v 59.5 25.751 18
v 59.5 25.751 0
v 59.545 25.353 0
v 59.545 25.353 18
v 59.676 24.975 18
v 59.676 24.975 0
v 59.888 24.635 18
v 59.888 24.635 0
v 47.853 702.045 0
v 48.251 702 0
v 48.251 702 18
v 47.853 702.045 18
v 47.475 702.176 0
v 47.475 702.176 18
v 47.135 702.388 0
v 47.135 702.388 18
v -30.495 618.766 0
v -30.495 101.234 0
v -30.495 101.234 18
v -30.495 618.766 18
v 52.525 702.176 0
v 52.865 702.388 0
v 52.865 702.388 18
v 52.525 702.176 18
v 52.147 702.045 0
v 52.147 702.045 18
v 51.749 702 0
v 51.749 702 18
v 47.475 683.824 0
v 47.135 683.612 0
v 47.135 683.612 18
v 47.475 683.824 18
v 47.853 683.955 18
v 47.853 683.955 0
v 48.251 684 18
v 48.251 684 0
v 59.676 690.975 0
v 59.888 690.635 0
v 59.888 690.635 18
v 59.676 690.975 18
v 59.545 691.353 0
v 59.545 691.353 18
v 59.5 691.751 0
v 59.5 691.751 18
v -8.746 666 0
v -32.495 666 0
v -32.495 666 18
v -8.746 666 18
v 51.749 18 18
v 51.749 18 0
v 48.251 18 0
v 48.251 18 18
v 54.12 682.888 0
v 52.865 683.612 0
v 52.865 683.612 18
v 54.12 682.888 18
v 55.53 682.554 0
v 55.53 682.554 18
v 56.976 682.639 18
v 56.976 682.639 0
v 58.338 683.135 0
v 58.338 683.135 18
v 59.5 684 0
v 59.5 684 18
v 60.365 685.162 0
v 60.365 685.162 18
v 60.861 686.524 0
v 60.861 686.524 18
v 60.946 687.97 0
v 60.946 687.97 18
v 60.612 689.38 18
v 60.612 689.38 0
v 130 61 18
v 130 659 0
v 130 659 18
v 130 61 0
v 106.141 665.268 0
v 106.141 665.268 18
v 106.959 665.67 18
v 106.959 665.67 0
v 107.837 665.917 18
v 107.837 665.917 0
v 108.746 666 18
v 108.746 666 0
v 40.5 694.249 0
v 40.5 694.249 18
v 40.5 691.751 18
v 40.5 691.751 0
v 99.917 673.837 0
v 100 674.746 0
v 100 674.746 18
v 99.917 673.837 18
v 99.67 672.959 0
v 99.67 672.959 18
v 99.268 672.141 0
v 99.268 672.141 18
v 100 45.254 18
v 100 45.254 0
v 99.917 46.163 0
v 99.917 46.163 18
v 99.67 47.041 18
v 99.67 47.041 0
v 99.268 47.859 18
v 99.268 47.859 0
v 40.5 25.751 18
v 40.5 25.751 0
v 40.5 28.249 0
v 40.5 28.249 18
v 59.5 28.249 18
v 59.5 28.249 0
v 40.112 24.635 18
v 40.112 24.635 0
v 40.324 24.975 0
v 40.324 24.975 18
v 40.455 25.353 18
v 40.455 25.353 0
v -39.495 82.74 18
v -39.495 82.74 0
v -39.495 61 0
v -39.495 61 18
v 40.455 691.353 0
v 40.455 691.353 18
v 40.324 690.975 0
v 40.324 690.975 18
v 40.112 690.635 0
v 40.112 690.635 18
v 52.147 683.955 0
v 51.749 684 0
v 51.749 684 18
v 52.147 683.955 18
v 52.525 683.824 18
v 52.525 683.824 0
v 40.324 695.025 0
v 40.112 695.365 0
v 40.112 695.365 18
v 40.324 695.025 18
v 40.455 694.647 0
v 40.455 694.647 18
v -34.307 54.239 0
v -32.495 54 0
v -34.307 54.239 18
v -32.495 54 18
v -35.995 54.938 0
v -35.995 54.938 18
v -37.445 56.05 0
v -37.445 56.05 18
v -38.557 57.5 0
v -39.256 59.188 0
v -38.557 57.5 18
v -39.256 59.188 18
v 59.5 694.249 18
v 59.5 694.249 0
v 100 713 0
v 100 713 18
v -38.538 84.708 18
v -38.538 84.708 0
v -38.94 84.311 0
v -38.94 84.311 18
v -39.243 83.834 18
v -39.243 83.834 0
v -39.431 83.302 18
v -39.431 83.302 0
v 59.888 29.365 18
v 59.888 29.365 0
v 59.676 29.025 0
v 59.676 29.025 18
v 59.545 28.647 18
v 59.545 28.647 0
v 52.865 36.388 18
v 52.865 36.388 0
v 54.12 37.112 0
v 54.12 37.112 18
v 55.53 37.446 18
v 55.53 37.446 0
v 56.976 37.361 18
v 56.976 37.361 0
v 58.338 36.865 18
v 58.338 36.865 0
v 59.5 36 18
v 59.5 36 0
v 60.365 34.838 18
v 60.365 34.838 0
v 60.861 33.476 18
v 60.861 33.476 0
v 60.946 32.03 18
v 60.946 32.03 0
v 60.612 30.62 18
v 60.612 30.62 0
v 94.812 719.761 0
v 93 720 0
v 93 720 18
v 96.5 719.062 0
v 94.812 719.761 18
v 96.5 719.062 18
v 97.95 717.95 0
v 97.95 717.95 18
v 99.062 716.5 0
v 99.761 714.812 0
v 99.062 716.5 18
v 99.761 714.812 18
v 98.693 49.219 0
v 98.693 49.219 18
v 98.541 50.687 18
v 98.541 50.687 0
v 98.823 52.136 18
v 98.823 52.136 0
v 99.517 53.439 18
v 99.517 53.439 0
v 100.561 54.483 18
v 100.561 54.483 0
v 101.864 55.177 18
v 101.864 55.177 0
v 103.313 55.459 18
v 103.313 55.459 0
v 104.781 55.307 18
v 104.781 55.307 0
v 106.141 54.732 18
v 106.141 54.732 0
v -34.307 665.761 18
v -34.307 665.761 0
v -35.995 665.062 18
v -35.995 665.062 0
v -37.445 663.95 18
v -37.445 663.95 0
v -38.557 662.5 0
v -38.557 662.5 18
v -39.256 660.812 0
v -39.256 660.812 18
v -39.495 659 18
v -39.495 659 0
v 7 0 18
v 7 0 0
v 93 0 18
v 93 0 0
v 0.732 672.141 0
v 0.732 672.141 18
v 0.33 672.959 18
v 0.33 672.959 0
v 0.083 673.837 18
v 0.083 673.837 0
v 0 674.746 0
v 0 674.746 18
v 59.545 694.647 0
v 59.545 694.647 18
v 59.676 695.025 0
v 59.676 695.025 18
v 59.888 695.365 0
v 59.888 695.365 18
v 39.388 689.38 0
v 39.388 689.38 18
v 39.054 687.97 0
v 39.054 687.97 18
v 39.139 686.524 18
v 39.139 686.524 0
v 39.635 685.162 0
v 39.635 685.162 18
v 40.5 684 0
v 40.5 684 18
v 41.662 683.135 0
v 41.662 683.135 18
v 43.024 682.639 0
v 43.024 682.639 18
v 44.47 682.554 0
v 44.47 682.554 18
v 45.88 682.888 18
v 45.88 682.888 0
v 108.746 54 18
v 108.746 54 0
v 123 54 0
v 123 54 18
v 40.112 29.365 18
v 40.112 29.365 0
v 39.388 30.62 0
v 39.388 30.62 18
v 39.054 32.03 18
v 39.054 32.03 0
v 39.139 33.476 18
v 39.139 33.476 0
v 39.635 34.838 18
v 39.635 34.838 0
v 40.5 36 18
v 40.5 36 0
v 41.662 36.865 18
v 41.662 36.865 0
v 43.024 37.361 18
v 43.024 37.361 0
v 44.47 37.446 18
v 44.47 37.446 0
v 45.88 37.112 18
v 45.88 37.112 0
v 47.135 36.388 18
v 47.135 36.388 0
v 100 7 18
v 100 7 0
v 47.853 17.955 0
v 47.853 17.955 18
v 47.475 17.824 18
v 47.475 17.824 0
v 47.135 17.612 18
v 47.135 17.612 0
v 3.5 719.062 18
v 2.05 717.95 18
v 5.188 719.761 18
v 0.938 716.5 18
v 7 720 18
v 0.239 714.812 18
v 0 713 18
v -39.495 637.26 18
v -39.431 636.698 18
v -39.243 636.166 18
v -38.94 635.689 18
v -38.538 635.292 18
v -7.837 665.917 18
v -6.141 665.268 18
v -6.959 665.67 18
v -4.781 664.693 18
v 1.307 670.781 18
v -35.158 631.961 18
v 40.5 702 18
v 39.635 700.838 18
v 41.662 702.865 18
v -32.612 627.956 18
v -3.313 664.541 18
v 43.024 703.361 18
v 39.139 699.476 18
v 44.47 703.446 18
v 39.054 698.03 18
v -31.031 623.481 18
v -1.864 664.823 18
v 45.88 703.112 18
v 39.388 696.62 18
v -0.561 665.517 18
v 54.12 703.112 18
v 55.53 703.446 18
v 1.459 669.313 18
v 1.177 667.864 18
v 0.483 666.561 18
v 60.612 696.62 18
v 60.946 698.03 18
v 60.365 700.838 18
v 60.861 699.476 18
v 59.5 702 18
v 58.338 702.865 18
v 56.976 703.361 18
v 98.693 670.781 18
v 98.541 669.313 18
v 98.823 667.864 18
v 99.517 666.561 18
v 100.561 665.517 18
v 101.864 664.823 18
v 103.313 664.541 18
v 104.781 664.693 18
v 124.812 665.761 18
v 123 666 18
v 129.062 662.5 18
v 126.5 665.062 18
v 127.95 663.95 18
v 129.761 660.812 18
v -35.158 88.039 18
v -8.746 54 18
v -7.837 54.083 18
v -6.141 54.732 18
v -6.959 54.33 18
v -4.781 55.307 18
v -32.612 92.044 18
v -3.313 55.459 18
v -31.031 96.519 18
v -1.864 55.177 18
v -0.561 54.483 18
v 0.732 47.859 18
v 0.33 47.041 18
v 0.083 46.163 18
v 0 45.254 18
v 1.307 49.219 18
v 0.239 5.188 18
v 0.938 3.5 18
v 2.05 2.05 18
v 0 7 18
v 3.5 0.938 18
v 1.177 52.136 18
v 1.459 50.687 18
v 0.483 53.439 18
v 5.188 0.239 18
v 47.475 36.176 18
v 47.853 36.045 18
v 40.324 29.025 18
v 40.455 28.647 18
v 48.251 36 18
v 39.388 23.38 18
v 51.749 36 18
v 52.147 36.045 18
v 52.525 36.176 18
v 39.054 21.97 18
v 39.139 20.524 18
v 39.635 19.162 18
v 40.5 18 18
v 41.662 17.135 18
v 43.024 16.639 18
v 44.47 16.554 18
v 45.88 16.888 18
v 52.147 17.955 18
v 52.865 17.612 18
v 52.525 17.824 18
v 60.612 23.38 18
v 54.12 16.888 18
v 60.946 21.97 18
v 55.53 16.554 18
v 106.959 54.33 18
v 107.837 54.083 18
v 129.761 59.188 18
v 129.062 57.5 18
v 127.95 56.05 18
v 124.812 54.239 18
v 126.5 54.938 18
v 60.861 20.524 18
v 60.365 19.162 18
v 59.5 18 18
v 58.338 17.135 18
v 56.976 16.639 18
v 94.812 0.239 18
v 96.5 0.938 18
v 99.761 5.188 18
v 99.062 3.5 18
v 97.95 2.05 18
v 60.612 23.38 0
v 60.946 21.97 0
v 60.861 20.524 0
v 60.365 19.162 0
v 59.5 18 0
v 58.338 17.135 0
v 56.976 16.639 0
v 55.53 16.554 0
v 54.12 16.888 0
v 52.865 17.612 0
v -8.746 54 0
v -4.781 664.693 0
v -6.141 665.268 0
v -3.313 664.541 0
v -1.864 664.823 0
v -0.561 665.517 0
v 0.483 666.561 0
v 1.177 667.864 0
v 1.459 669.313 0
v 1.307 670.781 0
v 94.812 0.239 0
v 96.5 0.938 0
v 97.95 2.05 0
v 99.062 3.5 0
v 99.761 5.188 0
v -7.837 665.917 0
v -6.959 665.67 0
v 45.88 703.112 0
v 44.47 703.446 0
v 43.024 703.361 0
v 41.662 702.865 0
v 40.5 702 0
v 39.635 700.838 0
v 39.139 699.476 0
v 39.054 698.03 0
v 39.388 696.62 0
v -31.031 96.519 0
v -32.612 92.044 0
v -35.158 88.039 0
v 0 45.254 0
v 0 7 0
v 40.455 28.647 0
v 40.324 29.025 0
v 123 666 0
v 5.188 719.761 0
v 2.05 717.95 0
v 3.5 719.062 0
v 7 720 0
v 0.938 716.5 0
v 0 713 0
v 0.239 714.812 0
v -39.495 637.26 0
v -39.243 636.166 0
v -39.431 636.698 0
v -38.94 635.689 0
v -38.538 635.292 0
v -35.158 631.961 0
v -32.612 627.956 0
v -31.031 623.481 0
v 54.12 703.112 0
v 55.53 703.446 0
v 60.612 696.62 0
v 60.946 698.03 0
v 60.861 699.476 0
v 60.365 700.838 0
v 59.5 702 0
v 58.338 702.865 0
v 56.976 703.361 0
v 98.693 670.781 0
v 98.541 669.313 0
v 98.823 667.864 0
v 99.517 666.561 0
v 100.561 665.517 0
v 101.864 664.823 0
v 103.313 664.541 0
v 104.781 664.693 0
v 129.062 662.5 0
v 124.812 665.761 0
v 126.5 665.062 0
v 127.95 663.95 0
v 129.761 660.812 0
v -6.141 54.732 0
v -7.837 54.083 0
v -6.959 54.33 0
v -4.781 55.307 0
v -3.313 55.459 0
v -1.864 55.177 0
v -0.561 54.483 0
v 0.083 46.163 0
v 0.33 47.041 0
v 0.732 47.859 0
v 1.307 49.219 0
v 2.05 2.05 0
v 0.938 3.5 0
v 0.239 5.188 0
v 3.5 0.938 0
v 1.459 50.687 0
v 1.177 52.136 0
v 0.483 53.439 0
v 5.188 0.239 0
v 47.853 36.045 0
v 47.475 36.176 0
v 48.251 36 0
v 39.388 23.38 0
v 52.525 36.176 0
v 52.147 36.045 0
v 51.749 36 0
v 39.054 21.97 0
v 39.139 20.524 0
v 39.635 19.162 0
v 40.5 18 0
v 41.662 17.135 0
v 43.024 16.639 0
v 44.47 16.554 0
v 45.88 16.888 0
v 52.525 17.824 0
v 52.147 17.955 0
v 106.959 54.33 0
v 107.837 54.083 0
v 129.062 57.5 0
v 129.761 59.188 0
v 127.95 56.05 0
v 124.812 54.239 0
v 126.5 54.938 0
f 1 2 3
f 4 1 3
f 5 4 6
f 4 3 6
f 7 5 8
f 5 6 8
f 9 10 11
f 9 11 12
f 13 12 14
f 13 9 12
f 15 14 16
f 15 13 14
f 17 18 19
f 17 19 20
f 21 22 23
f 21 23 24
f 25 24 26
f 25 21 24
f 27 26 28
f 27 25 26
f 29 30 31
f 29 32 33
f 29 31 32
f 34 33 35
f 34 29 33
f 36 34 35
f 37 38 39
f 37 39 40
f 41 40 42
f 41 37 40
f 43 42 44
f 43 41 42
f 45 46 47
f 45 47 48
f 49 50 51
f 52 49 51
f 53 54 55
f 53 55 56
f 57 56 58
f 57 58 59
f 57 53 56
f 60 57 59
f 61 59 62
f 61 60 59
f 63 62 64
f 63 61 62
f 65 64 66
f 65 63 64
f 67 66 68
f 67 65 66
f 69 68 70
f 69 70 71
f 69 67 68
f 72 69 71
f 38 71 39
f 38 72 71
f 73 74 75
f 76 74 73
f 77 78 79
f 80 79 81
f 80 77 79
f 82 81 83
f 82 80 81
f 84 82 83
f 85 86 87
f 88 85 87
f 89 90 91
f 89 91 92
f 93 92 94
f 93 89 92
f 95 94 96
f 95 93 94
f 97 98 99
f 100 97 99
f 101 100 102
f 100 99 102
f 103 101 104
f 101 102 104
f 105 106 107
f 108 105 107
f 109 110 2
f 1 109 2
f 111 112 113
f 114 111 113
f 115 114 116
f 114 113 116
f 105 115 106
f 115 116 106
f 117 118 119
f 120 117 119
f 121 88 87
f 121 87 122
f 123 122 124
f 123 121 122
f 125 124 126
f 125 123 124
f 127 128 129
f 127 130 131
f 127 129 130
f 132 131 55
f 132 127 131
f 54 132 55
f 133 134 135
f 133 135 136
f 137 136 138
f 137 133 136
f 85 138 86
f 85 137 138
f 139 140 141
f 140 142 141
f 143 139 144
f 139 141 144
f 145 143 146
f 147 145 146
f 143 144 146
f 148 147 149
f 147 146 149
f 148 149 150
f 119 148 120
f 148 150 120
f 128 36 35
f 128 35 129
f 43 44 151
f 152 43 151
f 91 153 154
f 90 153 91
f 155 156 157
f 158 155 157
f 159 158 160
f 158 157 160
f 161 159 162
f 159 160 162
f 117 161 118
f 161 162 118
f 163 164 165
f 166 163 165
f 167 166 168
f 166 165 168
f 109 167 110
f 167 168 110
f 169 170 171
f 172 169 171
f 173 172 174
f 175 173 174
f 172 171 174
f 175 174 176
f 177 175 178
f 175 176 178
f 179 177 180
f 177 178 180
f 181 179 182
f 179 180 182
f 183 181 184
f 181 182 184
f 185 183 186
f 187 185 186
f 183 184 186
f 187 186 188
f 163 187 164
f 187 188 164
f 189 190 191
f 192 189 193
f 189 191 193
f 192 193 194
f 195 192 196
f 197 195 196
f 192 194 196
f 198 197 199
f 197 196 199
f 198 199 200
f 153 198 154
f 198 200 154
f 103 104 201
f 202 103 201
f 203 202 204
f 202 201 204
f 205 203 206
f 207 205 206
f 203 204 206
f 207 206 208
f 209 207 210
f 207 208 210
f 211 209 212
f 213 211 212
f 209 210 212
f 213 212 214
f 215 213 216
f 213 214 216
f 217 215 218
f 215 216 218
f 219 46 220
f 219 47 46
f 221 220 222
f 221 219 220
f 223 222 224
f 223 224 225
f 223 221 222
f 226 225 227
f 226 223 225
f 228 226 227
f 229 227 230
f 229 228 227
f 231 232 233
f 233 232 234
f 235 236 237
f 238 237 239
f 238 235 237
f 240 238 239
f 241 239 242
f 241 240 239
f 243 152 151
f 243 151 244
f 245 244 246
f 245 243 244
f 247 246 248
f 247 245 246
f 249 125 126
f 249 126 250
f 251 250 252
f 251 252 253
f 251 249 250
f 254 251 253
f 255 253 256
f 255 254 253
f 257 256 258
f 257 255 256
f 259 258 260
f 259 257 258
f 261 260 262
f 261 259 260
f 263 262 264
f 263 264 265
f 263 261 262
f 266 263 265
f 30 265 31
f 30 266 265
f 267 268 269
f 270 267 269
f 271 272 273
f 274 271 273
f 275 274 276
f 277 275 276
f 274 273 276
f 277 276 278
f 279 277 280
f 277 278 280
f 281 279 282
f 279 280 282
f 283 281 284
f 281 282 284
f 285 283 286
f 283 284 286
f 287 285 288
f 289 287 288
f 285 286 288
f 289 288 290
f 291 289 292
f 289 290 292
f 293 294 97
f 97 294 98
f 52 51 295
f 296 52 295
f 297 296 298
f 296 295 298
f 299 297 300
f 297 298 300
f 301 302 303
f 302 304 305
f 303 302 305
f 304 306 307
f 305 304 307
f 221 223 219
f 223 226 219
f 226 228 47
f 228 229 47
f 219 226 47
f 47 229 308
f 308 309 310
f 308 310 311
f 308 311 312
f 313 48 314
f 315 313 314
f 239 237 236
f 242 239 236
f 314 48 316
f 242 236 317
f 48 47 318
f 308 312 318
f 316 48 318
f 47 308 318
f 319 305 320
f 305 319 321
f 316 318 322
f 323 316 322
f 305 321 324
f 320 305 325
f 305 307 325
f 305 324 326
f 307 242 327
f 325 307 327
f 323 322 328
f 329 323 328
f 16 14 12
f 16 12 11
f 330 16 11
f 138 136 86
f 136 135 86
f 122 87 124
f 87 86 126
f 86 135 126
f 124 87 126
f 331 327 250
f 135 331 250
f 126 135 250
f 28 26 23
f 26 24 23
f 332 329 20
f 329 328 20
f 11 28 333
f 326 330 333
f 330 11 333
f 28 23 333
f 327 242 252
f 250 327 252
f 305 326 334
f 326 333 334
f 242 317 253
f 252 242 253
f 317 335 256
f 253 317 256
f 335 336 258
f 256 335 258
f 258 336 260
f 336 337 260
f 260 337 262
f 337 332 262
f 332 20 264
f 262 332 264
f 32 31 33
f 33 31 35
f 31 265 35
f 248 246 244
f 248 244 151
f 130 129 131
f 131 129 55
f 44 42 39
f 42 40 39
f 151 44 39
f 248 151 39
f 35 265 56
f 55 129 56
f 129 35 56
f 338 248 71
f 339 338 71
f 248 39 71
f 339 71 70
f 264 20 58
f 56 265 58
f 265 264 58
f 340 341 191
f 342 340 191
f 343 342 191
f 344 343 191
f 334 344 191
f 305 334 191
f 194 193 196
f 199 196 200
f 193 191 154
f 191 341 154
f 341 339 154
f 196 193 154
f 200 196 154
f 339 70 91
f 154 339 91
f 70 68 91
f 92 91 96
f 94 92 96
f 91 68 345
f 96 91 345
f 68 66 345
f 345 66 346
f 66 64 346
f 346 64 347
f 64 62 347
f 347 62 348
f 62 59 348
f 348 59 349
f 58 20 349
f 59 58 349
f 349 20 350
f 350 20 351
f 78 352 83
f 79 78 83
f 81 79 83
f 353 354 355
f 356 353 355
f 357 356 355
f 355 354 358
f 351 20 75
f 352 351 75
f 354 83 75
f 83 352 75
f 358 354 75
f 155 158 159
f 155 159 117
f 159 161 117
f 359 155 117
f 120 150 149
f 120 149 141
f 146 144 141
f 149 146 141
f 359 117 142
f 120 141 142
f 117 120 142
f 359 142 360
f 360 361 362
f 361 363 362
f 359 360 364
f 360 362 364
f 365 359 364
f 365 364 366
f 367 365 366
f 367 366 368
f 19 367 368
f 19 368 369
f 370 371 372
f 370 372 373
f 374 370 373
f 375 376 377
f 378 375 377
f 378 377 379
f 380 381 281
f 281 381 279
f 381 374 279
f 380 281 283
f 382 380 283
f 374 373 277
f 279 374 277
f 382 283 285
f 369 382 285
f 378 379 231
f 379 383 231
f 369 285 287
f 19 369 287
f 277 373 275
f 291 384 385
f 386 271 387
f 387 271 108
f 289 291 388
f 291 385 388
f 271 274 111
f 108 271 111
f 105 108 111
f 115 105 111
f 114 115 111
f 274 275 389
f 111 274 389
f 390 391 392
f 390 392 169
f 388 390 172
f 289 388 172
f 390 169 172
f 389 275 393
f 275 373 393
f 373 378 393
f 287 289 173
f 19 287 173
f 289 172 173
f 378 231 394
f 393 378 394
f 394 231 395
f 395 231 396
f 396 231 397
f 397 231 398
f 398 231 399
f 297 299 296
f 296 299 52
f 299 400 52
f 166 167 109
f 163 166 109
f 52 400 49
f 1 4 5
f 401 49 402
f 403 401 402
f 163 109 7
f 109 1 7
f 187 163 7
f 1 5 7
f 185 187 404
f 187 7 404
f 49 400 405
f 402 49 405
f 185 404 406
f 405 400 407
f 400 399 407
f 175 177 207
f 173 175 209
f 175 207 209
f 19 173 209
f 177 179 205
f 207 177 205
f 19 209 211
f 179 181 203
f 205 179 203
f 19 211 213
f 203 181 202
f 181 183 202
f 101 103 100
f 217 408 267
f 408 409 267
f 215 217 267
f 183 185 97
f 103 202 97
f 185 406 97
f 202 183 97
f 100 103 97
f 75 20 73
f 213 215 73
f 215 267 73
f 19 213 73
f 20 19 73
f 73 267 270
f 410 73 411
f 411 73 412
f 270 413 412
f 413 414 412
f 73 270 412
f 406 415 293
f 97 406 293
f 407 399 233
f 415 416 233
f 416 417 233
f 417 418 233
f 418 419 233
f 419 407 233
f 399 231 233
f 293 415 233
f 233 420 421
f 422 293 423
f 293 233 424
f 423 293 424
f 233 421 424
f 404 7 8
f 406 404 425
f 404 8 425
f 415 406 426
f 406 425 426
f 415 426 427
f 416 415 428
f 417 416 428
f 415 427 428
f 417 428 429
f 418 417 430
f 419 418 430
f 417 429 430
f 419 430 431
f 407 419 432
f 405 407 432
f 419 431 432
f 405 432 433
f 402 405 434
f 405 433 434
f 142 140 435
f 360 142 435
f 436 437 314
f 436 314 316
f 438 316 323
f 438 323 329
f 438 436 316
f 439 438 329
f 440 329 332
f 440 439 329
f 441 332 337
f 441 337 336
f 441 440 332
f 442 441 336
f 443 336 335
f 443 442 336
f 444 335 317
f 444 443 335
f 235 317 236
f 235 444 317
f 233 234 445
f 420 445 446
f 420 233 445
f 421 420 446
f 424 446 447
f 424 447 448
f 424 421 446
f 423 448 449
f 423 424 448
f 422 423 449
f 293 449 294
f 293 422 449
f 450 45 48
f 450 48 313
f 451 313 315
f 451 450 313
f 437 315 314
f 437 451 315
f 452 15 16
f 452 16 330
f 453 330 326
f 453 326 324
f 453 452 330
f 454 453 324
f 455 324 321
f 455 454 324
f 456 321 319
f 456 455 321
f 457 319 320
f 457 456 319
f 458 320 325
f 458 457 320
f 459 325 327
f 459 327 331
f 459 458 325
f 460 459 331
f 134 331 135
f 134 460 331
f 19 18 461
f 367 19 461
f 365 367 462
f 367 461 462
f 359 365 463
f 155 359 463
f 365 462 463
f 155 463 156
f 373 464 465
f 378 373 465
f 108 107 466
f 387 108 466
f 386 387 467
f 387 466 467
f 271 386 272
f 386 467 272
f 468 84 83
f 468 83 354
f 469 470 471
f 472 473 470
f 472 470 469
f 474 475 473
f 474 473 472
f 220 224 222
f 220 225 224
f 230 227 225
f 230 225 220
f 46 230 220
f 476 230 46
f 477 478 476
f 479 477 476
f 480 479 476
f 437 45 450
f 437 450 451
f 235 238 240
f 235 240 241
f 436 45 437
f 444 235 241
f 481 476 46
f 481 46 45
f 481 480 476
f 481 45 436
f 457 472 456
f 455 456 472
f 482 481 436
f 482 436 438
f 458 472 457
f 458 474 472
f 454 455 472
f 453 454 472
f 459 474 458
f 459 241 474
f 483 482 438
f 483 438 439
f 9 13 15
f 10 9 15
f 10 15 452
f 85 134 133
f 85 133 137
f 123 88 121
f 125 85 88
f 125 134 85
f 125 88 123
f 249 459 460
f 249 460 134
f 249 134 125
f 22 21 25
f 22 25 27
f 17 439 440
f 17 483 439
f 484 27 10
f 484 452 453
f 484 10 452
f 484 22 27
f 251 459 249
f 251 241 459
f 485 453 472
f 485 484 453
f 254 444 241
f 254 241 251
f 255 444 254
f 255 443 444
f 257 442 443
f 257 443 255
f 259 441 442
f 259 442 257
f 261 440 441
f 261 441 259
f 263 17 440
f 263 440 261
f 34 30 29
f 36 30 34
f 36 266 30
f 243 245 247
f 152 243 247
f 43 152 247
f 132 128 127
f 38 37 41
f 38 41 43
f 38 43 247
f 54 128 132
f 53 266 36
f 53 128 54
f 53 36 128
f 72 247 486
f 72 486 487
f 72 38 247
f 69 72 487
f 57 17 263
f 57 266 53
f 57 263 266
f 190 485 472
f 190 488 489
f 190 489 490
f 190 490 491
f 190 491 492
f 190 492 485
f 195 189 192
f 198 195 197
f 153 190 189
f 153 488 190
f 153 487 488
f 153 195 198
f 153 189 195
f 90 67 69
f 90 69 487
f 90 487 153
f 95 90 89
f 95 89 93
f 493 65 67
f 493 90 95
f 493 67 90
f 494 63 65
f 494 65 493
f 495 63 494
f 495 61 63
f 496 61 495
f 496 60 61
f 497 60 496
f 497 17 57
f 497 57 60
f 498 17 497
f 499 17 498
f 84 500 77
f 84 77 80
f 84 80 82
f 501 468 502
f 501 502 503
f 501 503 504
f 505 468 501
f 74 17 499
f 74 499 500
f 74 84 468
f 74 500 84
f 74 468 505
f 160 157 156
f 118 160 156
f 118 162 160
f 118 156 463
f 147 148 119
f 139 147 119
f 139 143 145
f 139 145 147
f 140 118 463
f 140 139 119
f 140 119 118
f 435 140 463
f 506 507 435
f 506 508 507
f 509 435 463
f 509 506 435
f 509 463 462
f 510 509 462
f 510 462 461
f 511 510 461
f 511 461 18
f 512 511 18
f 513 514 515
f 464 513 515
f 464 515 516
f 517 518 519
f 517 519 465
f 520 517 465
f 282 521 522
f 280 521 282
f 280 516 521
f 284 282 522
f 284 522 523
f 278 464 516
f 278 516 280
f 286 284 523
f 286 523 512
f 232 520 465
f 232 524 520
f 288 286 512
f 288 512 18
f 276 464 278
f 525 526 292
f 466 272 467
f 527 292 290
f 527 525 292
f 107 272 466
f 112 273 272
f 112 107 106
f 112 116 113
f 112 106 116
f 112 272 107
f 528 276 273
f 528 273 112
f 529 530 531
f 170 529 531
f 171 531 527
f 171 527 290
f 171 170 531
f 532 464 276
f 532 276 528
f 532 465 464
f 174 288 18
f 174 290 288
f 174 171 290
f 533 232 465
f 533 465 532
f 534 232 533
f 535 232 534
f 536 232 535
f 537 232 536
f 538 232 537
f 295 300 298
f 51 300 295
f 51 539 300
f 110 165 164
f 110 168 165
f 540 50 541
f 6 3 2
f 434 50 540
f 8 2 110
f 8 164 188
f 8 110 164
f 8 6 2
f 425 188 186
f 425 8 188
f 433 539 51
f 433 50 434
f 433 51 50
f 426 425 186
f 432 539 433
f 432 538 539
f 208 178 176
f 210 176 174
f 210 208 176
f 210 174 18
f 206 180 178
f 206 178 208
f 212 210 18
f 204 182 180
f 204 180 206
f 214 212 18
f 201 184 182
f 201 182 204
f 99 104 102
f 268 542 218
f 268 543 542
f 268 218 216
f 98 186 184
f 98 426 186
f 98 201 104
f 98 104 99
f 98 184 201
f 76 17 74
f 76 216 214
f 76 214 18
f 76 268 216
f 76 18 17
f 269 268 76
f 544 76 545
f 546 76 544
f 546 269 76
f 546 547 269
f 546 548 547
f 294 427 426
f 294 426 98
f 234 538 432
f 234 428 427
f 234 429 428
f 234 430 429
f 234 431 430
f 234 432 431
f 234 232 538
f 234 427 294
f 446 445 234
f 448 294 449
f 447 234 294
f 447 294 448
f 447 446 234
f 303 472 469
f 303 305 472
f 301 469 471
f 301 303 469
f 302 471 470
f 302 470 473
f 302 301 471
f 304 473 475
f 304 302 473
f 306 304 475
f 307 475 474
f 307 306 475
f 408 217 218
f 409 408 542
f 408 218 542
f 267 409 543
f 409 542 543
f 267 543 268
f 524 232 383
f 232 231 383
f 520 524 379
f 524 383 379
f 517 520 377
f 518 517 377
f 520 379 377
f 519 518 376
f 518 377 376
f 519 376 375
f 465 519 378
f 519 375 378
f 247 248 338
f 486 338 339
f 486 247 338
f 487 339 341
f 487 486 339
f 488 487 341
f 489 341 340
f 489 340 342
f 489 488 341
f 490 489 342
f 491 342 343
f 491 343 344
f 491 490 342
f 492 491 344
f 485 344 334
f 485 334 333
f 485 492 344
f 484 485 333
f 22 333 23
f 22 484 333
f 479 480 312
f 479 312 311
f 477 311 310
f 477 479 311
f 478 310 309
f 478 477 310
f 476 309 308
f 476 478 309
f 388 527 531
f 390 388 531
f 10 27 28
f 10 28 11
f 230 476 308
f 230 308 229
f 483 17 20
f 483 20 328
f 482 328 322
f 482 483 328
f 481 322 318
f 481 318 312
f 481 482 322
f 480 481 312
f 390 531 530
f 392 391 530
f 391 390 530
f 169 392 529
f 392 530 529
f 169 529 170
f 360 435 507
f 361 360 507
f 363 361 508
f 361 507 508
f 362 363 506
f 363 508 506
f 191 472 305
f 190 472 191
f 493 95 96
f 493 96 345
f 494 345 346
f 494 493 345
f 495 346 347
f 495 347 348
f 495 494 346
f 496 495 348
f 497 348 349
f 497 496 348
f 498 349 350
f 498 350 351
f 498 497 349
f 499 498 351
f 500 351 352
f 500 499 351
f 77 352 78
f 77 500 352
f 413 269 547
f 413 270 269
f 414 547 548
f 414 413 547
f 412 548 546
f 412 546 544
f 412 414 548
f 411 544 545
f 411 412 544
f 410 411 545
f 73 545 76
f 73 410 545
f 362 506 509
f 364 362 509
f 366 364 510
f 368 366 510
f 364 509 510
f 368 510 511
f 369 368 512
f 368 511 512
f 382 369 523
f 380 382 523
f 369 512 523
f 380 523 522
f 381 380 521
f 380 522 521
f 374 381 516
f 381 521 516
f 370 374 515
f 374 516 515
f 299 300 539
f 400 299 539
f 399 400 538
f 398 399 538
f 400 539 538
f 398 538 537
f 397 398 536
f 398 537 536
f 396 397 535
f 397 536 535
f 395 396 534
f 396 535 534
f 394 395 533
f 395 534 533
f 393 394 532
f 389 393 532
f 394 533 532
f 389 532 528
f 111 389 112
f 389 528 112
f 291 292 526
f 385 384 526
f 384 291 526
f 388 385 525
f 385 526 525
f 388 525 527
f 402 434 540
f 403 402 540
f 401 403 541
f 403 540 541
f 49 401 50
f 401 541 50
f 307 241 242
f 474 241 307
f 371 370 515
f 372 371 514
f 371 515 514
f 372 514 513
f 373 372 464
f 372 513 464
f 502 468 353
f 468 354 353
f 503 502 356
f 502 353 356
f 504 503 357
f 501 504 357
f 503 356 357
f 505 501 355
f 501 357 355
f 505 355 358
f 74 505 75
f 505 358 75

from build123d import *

# Parameters (mm, degrees)
BOSS_EXTRU_2_DEPTH      = 18
ENL_V_MAT_EXTRU_1_DEPTH = 19
CONG_1_R                = 7


with BuildPart() as part:
    # Esquisse2 → Boss.-Extru.2 (new body)
    with BuildSketch(Plane.XY):
        with BuildLine():
            Line((0, 0), (100, 0))
            Line((100, 0), (100, 45.254412261))
            ThreePointArc((100, 45.254412261), (99.813462099, 46.607402512), (99.267766953, 47.859439178))
            ThreePointArc((99.267766953, 47.859439178), (100, 54), (106.140560822, 54.732233047))
            ThreePointArc((106.140560822, 54.732233047), (107.392597488, 54.186537901), (108.745587739, 54))
            Line((108.745587739, 54), (130, 54))
            Line((130, 54), (130, 360))
            Line((130, 360), (-30.494949366, 360))
            Line((-30.494949366, 360), (-30.494949366, 101.23368794))
            ThreePointArc((-30.494949366, 101.23368794), (-32.612333247, 92.044193475), (-38.537502558, 84.707812102))
            ThreePointArc((-38.537502558, 84.707812102), (-39.242879856, 83.834433367), (-39.494949366, 82.740445931))
            Line((-39.494949366, 82.740445931), (-39.494949366, 54))
            Line((-39.494949366, 54), (-8.745587739, 54))
            ThreePointArc((-8.745587739, 54), (-7.392597488, 54.186537901), (-6.140560822, 54.732233047))
            ThreePointArc((-6.140560822, 54.732233047), (0, 54), (0.732233047, 47.859439178))
            ThreePointArc((0.732233047, 47.859439178), (0.186537901, 46.607402512), (0, 45.254412261))
            Line((0, 45.254412261), (0, 0))
        make_face()
    extrude(amount=BOSS_EXTRU_2_DEPTH)

    # Esquisse1 → Enlèv. mat.-Extru.1 (cut, through all)
    with BuildSketch(Plane.XY):
        with BuildLine():
            Line((59.5, 28.248771852), (59.5, 25.751228148))
            ThreePointArc((59.5, 25.751228148), (59.599672829, 25.160561143), (59.88765279, 24.635309084))
            ThreePointArc((59.88765279, 24.635309084), (59.5, 18), (52.864690916, 17.61234721))
            ThreePointArc((52.864690916, 17.61234721), (52.339438857, 17.900327171), (51.748771852, 18))
            Line((51.748771852, 18), (48.251228148, 18))
            ThreePointArc((48.251228148, 18), (47.660561143, 17.900327171), (47.135309084, 17.61234721))
            ThreePointArc((47.135309084, 17.61234721), (40.5, 18), (40.11234721, 24.635309084))
            ThreePointArc((40.11234721, 24.635309084), (40.400327171, 25.160561143), (40.5, 25.751228148))
            Line((40.5, 25.751228148), (40.5, 28.248771852))
            ThreePointArc((40.5, 28.248771852), (40.400327171, 28.839438857), (40.11234721, 29.364690916))
            ThreePointArc((40.11234721, 29.364690916), (40.5, 36), (47.135309084, 36.38765279))
            ThreePointArc((47.135309084, 36.38765279), (47.660561143, 36.099672829), (48.251228148, 36))
            Line((48.251228148, 36), (51.748771852, 36))
            ThreePointArc((51.748771852, 36), (52.339438857, 36.099672829), (52.864690916, 36.38765279))
            ThreePointArc((52.864690916, 36.38765279), (59.5, 36), (59.88765279, 29.364690916))
            ThreePointArc((59.88765279, 29.364690916), (59.599672829, 28.839438857), (59.5, 28.248771852))
        make_face()
    extrude(amount=ENL_V_MAT_EXTRU_1_DEPTH, mode=Mode.SUBTRACT)

    # Congé1
    cong_1_edges = [part.edges().sort_by_distance(p)[0] for p in [
        (-39.494949366, 54, 9),
        (130, 54, 9),
        (100, 0, 9),
        (0, 0, 9),
    ]]
    fillet(cong_1_edges, radius=CONG_1_R)

    # Symétrie1: part across plane


with BuildPart() as part_1:
    add(part.part)
    add(part.part.mirror(Plane(origin=(130, 360, 18), x_dir=(0, 0, 1), z_dir=(0, -1, 0))))


solid = part_1.part
